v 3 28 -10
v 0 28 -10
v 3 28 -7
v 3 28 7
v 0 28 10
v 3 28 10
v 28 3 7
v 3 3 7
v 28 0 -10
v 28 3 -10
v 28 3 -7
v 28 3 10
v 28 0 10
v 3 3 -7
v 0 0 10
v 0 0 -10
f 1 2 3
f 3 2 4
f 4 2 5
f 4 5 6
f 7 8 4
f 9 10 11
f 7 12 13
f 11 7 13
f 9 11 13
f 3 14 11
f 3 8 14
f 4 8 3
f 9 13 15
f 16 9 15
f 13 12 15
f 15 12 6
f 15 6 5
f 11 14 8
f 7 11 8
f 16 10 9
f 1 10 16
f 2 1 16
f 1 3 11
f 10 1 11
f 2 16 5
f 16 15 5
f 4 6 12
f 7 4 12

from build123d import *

# Parameters (mm, degrees)
BODY_DEPTH      = 10
SHELL_START     = 3
SHELL_OUTLINE_W = 26
SHELL_OUTLINE_H = 14
SHELL_DEPTH     = 25


# Read off the part's stored shape, not the designer's step: Shell
with BuildPart() as part:
    # Sketch1 → Body (new, symmetric)
    with BuildSketch(Plane.XY):
        Polygon((28, 0), (0, 0), (0, 28), (3, 28), (28, 3), align=None)
    extrude(amount=BODY_DEPTH, both=True)

    # Shell outline → Shell (cut)
    with BuildSketch(Plane.YZ.offset(SHELL_START)):
        with Locations((16, 0)):
            Rectangle(SHELL_OUTLINE_W, SHELL_OUTLINE_H)
    extrude(amount=SHELL_DEPTH, mode=Mode.SUBTRACT)


solid = part.part
